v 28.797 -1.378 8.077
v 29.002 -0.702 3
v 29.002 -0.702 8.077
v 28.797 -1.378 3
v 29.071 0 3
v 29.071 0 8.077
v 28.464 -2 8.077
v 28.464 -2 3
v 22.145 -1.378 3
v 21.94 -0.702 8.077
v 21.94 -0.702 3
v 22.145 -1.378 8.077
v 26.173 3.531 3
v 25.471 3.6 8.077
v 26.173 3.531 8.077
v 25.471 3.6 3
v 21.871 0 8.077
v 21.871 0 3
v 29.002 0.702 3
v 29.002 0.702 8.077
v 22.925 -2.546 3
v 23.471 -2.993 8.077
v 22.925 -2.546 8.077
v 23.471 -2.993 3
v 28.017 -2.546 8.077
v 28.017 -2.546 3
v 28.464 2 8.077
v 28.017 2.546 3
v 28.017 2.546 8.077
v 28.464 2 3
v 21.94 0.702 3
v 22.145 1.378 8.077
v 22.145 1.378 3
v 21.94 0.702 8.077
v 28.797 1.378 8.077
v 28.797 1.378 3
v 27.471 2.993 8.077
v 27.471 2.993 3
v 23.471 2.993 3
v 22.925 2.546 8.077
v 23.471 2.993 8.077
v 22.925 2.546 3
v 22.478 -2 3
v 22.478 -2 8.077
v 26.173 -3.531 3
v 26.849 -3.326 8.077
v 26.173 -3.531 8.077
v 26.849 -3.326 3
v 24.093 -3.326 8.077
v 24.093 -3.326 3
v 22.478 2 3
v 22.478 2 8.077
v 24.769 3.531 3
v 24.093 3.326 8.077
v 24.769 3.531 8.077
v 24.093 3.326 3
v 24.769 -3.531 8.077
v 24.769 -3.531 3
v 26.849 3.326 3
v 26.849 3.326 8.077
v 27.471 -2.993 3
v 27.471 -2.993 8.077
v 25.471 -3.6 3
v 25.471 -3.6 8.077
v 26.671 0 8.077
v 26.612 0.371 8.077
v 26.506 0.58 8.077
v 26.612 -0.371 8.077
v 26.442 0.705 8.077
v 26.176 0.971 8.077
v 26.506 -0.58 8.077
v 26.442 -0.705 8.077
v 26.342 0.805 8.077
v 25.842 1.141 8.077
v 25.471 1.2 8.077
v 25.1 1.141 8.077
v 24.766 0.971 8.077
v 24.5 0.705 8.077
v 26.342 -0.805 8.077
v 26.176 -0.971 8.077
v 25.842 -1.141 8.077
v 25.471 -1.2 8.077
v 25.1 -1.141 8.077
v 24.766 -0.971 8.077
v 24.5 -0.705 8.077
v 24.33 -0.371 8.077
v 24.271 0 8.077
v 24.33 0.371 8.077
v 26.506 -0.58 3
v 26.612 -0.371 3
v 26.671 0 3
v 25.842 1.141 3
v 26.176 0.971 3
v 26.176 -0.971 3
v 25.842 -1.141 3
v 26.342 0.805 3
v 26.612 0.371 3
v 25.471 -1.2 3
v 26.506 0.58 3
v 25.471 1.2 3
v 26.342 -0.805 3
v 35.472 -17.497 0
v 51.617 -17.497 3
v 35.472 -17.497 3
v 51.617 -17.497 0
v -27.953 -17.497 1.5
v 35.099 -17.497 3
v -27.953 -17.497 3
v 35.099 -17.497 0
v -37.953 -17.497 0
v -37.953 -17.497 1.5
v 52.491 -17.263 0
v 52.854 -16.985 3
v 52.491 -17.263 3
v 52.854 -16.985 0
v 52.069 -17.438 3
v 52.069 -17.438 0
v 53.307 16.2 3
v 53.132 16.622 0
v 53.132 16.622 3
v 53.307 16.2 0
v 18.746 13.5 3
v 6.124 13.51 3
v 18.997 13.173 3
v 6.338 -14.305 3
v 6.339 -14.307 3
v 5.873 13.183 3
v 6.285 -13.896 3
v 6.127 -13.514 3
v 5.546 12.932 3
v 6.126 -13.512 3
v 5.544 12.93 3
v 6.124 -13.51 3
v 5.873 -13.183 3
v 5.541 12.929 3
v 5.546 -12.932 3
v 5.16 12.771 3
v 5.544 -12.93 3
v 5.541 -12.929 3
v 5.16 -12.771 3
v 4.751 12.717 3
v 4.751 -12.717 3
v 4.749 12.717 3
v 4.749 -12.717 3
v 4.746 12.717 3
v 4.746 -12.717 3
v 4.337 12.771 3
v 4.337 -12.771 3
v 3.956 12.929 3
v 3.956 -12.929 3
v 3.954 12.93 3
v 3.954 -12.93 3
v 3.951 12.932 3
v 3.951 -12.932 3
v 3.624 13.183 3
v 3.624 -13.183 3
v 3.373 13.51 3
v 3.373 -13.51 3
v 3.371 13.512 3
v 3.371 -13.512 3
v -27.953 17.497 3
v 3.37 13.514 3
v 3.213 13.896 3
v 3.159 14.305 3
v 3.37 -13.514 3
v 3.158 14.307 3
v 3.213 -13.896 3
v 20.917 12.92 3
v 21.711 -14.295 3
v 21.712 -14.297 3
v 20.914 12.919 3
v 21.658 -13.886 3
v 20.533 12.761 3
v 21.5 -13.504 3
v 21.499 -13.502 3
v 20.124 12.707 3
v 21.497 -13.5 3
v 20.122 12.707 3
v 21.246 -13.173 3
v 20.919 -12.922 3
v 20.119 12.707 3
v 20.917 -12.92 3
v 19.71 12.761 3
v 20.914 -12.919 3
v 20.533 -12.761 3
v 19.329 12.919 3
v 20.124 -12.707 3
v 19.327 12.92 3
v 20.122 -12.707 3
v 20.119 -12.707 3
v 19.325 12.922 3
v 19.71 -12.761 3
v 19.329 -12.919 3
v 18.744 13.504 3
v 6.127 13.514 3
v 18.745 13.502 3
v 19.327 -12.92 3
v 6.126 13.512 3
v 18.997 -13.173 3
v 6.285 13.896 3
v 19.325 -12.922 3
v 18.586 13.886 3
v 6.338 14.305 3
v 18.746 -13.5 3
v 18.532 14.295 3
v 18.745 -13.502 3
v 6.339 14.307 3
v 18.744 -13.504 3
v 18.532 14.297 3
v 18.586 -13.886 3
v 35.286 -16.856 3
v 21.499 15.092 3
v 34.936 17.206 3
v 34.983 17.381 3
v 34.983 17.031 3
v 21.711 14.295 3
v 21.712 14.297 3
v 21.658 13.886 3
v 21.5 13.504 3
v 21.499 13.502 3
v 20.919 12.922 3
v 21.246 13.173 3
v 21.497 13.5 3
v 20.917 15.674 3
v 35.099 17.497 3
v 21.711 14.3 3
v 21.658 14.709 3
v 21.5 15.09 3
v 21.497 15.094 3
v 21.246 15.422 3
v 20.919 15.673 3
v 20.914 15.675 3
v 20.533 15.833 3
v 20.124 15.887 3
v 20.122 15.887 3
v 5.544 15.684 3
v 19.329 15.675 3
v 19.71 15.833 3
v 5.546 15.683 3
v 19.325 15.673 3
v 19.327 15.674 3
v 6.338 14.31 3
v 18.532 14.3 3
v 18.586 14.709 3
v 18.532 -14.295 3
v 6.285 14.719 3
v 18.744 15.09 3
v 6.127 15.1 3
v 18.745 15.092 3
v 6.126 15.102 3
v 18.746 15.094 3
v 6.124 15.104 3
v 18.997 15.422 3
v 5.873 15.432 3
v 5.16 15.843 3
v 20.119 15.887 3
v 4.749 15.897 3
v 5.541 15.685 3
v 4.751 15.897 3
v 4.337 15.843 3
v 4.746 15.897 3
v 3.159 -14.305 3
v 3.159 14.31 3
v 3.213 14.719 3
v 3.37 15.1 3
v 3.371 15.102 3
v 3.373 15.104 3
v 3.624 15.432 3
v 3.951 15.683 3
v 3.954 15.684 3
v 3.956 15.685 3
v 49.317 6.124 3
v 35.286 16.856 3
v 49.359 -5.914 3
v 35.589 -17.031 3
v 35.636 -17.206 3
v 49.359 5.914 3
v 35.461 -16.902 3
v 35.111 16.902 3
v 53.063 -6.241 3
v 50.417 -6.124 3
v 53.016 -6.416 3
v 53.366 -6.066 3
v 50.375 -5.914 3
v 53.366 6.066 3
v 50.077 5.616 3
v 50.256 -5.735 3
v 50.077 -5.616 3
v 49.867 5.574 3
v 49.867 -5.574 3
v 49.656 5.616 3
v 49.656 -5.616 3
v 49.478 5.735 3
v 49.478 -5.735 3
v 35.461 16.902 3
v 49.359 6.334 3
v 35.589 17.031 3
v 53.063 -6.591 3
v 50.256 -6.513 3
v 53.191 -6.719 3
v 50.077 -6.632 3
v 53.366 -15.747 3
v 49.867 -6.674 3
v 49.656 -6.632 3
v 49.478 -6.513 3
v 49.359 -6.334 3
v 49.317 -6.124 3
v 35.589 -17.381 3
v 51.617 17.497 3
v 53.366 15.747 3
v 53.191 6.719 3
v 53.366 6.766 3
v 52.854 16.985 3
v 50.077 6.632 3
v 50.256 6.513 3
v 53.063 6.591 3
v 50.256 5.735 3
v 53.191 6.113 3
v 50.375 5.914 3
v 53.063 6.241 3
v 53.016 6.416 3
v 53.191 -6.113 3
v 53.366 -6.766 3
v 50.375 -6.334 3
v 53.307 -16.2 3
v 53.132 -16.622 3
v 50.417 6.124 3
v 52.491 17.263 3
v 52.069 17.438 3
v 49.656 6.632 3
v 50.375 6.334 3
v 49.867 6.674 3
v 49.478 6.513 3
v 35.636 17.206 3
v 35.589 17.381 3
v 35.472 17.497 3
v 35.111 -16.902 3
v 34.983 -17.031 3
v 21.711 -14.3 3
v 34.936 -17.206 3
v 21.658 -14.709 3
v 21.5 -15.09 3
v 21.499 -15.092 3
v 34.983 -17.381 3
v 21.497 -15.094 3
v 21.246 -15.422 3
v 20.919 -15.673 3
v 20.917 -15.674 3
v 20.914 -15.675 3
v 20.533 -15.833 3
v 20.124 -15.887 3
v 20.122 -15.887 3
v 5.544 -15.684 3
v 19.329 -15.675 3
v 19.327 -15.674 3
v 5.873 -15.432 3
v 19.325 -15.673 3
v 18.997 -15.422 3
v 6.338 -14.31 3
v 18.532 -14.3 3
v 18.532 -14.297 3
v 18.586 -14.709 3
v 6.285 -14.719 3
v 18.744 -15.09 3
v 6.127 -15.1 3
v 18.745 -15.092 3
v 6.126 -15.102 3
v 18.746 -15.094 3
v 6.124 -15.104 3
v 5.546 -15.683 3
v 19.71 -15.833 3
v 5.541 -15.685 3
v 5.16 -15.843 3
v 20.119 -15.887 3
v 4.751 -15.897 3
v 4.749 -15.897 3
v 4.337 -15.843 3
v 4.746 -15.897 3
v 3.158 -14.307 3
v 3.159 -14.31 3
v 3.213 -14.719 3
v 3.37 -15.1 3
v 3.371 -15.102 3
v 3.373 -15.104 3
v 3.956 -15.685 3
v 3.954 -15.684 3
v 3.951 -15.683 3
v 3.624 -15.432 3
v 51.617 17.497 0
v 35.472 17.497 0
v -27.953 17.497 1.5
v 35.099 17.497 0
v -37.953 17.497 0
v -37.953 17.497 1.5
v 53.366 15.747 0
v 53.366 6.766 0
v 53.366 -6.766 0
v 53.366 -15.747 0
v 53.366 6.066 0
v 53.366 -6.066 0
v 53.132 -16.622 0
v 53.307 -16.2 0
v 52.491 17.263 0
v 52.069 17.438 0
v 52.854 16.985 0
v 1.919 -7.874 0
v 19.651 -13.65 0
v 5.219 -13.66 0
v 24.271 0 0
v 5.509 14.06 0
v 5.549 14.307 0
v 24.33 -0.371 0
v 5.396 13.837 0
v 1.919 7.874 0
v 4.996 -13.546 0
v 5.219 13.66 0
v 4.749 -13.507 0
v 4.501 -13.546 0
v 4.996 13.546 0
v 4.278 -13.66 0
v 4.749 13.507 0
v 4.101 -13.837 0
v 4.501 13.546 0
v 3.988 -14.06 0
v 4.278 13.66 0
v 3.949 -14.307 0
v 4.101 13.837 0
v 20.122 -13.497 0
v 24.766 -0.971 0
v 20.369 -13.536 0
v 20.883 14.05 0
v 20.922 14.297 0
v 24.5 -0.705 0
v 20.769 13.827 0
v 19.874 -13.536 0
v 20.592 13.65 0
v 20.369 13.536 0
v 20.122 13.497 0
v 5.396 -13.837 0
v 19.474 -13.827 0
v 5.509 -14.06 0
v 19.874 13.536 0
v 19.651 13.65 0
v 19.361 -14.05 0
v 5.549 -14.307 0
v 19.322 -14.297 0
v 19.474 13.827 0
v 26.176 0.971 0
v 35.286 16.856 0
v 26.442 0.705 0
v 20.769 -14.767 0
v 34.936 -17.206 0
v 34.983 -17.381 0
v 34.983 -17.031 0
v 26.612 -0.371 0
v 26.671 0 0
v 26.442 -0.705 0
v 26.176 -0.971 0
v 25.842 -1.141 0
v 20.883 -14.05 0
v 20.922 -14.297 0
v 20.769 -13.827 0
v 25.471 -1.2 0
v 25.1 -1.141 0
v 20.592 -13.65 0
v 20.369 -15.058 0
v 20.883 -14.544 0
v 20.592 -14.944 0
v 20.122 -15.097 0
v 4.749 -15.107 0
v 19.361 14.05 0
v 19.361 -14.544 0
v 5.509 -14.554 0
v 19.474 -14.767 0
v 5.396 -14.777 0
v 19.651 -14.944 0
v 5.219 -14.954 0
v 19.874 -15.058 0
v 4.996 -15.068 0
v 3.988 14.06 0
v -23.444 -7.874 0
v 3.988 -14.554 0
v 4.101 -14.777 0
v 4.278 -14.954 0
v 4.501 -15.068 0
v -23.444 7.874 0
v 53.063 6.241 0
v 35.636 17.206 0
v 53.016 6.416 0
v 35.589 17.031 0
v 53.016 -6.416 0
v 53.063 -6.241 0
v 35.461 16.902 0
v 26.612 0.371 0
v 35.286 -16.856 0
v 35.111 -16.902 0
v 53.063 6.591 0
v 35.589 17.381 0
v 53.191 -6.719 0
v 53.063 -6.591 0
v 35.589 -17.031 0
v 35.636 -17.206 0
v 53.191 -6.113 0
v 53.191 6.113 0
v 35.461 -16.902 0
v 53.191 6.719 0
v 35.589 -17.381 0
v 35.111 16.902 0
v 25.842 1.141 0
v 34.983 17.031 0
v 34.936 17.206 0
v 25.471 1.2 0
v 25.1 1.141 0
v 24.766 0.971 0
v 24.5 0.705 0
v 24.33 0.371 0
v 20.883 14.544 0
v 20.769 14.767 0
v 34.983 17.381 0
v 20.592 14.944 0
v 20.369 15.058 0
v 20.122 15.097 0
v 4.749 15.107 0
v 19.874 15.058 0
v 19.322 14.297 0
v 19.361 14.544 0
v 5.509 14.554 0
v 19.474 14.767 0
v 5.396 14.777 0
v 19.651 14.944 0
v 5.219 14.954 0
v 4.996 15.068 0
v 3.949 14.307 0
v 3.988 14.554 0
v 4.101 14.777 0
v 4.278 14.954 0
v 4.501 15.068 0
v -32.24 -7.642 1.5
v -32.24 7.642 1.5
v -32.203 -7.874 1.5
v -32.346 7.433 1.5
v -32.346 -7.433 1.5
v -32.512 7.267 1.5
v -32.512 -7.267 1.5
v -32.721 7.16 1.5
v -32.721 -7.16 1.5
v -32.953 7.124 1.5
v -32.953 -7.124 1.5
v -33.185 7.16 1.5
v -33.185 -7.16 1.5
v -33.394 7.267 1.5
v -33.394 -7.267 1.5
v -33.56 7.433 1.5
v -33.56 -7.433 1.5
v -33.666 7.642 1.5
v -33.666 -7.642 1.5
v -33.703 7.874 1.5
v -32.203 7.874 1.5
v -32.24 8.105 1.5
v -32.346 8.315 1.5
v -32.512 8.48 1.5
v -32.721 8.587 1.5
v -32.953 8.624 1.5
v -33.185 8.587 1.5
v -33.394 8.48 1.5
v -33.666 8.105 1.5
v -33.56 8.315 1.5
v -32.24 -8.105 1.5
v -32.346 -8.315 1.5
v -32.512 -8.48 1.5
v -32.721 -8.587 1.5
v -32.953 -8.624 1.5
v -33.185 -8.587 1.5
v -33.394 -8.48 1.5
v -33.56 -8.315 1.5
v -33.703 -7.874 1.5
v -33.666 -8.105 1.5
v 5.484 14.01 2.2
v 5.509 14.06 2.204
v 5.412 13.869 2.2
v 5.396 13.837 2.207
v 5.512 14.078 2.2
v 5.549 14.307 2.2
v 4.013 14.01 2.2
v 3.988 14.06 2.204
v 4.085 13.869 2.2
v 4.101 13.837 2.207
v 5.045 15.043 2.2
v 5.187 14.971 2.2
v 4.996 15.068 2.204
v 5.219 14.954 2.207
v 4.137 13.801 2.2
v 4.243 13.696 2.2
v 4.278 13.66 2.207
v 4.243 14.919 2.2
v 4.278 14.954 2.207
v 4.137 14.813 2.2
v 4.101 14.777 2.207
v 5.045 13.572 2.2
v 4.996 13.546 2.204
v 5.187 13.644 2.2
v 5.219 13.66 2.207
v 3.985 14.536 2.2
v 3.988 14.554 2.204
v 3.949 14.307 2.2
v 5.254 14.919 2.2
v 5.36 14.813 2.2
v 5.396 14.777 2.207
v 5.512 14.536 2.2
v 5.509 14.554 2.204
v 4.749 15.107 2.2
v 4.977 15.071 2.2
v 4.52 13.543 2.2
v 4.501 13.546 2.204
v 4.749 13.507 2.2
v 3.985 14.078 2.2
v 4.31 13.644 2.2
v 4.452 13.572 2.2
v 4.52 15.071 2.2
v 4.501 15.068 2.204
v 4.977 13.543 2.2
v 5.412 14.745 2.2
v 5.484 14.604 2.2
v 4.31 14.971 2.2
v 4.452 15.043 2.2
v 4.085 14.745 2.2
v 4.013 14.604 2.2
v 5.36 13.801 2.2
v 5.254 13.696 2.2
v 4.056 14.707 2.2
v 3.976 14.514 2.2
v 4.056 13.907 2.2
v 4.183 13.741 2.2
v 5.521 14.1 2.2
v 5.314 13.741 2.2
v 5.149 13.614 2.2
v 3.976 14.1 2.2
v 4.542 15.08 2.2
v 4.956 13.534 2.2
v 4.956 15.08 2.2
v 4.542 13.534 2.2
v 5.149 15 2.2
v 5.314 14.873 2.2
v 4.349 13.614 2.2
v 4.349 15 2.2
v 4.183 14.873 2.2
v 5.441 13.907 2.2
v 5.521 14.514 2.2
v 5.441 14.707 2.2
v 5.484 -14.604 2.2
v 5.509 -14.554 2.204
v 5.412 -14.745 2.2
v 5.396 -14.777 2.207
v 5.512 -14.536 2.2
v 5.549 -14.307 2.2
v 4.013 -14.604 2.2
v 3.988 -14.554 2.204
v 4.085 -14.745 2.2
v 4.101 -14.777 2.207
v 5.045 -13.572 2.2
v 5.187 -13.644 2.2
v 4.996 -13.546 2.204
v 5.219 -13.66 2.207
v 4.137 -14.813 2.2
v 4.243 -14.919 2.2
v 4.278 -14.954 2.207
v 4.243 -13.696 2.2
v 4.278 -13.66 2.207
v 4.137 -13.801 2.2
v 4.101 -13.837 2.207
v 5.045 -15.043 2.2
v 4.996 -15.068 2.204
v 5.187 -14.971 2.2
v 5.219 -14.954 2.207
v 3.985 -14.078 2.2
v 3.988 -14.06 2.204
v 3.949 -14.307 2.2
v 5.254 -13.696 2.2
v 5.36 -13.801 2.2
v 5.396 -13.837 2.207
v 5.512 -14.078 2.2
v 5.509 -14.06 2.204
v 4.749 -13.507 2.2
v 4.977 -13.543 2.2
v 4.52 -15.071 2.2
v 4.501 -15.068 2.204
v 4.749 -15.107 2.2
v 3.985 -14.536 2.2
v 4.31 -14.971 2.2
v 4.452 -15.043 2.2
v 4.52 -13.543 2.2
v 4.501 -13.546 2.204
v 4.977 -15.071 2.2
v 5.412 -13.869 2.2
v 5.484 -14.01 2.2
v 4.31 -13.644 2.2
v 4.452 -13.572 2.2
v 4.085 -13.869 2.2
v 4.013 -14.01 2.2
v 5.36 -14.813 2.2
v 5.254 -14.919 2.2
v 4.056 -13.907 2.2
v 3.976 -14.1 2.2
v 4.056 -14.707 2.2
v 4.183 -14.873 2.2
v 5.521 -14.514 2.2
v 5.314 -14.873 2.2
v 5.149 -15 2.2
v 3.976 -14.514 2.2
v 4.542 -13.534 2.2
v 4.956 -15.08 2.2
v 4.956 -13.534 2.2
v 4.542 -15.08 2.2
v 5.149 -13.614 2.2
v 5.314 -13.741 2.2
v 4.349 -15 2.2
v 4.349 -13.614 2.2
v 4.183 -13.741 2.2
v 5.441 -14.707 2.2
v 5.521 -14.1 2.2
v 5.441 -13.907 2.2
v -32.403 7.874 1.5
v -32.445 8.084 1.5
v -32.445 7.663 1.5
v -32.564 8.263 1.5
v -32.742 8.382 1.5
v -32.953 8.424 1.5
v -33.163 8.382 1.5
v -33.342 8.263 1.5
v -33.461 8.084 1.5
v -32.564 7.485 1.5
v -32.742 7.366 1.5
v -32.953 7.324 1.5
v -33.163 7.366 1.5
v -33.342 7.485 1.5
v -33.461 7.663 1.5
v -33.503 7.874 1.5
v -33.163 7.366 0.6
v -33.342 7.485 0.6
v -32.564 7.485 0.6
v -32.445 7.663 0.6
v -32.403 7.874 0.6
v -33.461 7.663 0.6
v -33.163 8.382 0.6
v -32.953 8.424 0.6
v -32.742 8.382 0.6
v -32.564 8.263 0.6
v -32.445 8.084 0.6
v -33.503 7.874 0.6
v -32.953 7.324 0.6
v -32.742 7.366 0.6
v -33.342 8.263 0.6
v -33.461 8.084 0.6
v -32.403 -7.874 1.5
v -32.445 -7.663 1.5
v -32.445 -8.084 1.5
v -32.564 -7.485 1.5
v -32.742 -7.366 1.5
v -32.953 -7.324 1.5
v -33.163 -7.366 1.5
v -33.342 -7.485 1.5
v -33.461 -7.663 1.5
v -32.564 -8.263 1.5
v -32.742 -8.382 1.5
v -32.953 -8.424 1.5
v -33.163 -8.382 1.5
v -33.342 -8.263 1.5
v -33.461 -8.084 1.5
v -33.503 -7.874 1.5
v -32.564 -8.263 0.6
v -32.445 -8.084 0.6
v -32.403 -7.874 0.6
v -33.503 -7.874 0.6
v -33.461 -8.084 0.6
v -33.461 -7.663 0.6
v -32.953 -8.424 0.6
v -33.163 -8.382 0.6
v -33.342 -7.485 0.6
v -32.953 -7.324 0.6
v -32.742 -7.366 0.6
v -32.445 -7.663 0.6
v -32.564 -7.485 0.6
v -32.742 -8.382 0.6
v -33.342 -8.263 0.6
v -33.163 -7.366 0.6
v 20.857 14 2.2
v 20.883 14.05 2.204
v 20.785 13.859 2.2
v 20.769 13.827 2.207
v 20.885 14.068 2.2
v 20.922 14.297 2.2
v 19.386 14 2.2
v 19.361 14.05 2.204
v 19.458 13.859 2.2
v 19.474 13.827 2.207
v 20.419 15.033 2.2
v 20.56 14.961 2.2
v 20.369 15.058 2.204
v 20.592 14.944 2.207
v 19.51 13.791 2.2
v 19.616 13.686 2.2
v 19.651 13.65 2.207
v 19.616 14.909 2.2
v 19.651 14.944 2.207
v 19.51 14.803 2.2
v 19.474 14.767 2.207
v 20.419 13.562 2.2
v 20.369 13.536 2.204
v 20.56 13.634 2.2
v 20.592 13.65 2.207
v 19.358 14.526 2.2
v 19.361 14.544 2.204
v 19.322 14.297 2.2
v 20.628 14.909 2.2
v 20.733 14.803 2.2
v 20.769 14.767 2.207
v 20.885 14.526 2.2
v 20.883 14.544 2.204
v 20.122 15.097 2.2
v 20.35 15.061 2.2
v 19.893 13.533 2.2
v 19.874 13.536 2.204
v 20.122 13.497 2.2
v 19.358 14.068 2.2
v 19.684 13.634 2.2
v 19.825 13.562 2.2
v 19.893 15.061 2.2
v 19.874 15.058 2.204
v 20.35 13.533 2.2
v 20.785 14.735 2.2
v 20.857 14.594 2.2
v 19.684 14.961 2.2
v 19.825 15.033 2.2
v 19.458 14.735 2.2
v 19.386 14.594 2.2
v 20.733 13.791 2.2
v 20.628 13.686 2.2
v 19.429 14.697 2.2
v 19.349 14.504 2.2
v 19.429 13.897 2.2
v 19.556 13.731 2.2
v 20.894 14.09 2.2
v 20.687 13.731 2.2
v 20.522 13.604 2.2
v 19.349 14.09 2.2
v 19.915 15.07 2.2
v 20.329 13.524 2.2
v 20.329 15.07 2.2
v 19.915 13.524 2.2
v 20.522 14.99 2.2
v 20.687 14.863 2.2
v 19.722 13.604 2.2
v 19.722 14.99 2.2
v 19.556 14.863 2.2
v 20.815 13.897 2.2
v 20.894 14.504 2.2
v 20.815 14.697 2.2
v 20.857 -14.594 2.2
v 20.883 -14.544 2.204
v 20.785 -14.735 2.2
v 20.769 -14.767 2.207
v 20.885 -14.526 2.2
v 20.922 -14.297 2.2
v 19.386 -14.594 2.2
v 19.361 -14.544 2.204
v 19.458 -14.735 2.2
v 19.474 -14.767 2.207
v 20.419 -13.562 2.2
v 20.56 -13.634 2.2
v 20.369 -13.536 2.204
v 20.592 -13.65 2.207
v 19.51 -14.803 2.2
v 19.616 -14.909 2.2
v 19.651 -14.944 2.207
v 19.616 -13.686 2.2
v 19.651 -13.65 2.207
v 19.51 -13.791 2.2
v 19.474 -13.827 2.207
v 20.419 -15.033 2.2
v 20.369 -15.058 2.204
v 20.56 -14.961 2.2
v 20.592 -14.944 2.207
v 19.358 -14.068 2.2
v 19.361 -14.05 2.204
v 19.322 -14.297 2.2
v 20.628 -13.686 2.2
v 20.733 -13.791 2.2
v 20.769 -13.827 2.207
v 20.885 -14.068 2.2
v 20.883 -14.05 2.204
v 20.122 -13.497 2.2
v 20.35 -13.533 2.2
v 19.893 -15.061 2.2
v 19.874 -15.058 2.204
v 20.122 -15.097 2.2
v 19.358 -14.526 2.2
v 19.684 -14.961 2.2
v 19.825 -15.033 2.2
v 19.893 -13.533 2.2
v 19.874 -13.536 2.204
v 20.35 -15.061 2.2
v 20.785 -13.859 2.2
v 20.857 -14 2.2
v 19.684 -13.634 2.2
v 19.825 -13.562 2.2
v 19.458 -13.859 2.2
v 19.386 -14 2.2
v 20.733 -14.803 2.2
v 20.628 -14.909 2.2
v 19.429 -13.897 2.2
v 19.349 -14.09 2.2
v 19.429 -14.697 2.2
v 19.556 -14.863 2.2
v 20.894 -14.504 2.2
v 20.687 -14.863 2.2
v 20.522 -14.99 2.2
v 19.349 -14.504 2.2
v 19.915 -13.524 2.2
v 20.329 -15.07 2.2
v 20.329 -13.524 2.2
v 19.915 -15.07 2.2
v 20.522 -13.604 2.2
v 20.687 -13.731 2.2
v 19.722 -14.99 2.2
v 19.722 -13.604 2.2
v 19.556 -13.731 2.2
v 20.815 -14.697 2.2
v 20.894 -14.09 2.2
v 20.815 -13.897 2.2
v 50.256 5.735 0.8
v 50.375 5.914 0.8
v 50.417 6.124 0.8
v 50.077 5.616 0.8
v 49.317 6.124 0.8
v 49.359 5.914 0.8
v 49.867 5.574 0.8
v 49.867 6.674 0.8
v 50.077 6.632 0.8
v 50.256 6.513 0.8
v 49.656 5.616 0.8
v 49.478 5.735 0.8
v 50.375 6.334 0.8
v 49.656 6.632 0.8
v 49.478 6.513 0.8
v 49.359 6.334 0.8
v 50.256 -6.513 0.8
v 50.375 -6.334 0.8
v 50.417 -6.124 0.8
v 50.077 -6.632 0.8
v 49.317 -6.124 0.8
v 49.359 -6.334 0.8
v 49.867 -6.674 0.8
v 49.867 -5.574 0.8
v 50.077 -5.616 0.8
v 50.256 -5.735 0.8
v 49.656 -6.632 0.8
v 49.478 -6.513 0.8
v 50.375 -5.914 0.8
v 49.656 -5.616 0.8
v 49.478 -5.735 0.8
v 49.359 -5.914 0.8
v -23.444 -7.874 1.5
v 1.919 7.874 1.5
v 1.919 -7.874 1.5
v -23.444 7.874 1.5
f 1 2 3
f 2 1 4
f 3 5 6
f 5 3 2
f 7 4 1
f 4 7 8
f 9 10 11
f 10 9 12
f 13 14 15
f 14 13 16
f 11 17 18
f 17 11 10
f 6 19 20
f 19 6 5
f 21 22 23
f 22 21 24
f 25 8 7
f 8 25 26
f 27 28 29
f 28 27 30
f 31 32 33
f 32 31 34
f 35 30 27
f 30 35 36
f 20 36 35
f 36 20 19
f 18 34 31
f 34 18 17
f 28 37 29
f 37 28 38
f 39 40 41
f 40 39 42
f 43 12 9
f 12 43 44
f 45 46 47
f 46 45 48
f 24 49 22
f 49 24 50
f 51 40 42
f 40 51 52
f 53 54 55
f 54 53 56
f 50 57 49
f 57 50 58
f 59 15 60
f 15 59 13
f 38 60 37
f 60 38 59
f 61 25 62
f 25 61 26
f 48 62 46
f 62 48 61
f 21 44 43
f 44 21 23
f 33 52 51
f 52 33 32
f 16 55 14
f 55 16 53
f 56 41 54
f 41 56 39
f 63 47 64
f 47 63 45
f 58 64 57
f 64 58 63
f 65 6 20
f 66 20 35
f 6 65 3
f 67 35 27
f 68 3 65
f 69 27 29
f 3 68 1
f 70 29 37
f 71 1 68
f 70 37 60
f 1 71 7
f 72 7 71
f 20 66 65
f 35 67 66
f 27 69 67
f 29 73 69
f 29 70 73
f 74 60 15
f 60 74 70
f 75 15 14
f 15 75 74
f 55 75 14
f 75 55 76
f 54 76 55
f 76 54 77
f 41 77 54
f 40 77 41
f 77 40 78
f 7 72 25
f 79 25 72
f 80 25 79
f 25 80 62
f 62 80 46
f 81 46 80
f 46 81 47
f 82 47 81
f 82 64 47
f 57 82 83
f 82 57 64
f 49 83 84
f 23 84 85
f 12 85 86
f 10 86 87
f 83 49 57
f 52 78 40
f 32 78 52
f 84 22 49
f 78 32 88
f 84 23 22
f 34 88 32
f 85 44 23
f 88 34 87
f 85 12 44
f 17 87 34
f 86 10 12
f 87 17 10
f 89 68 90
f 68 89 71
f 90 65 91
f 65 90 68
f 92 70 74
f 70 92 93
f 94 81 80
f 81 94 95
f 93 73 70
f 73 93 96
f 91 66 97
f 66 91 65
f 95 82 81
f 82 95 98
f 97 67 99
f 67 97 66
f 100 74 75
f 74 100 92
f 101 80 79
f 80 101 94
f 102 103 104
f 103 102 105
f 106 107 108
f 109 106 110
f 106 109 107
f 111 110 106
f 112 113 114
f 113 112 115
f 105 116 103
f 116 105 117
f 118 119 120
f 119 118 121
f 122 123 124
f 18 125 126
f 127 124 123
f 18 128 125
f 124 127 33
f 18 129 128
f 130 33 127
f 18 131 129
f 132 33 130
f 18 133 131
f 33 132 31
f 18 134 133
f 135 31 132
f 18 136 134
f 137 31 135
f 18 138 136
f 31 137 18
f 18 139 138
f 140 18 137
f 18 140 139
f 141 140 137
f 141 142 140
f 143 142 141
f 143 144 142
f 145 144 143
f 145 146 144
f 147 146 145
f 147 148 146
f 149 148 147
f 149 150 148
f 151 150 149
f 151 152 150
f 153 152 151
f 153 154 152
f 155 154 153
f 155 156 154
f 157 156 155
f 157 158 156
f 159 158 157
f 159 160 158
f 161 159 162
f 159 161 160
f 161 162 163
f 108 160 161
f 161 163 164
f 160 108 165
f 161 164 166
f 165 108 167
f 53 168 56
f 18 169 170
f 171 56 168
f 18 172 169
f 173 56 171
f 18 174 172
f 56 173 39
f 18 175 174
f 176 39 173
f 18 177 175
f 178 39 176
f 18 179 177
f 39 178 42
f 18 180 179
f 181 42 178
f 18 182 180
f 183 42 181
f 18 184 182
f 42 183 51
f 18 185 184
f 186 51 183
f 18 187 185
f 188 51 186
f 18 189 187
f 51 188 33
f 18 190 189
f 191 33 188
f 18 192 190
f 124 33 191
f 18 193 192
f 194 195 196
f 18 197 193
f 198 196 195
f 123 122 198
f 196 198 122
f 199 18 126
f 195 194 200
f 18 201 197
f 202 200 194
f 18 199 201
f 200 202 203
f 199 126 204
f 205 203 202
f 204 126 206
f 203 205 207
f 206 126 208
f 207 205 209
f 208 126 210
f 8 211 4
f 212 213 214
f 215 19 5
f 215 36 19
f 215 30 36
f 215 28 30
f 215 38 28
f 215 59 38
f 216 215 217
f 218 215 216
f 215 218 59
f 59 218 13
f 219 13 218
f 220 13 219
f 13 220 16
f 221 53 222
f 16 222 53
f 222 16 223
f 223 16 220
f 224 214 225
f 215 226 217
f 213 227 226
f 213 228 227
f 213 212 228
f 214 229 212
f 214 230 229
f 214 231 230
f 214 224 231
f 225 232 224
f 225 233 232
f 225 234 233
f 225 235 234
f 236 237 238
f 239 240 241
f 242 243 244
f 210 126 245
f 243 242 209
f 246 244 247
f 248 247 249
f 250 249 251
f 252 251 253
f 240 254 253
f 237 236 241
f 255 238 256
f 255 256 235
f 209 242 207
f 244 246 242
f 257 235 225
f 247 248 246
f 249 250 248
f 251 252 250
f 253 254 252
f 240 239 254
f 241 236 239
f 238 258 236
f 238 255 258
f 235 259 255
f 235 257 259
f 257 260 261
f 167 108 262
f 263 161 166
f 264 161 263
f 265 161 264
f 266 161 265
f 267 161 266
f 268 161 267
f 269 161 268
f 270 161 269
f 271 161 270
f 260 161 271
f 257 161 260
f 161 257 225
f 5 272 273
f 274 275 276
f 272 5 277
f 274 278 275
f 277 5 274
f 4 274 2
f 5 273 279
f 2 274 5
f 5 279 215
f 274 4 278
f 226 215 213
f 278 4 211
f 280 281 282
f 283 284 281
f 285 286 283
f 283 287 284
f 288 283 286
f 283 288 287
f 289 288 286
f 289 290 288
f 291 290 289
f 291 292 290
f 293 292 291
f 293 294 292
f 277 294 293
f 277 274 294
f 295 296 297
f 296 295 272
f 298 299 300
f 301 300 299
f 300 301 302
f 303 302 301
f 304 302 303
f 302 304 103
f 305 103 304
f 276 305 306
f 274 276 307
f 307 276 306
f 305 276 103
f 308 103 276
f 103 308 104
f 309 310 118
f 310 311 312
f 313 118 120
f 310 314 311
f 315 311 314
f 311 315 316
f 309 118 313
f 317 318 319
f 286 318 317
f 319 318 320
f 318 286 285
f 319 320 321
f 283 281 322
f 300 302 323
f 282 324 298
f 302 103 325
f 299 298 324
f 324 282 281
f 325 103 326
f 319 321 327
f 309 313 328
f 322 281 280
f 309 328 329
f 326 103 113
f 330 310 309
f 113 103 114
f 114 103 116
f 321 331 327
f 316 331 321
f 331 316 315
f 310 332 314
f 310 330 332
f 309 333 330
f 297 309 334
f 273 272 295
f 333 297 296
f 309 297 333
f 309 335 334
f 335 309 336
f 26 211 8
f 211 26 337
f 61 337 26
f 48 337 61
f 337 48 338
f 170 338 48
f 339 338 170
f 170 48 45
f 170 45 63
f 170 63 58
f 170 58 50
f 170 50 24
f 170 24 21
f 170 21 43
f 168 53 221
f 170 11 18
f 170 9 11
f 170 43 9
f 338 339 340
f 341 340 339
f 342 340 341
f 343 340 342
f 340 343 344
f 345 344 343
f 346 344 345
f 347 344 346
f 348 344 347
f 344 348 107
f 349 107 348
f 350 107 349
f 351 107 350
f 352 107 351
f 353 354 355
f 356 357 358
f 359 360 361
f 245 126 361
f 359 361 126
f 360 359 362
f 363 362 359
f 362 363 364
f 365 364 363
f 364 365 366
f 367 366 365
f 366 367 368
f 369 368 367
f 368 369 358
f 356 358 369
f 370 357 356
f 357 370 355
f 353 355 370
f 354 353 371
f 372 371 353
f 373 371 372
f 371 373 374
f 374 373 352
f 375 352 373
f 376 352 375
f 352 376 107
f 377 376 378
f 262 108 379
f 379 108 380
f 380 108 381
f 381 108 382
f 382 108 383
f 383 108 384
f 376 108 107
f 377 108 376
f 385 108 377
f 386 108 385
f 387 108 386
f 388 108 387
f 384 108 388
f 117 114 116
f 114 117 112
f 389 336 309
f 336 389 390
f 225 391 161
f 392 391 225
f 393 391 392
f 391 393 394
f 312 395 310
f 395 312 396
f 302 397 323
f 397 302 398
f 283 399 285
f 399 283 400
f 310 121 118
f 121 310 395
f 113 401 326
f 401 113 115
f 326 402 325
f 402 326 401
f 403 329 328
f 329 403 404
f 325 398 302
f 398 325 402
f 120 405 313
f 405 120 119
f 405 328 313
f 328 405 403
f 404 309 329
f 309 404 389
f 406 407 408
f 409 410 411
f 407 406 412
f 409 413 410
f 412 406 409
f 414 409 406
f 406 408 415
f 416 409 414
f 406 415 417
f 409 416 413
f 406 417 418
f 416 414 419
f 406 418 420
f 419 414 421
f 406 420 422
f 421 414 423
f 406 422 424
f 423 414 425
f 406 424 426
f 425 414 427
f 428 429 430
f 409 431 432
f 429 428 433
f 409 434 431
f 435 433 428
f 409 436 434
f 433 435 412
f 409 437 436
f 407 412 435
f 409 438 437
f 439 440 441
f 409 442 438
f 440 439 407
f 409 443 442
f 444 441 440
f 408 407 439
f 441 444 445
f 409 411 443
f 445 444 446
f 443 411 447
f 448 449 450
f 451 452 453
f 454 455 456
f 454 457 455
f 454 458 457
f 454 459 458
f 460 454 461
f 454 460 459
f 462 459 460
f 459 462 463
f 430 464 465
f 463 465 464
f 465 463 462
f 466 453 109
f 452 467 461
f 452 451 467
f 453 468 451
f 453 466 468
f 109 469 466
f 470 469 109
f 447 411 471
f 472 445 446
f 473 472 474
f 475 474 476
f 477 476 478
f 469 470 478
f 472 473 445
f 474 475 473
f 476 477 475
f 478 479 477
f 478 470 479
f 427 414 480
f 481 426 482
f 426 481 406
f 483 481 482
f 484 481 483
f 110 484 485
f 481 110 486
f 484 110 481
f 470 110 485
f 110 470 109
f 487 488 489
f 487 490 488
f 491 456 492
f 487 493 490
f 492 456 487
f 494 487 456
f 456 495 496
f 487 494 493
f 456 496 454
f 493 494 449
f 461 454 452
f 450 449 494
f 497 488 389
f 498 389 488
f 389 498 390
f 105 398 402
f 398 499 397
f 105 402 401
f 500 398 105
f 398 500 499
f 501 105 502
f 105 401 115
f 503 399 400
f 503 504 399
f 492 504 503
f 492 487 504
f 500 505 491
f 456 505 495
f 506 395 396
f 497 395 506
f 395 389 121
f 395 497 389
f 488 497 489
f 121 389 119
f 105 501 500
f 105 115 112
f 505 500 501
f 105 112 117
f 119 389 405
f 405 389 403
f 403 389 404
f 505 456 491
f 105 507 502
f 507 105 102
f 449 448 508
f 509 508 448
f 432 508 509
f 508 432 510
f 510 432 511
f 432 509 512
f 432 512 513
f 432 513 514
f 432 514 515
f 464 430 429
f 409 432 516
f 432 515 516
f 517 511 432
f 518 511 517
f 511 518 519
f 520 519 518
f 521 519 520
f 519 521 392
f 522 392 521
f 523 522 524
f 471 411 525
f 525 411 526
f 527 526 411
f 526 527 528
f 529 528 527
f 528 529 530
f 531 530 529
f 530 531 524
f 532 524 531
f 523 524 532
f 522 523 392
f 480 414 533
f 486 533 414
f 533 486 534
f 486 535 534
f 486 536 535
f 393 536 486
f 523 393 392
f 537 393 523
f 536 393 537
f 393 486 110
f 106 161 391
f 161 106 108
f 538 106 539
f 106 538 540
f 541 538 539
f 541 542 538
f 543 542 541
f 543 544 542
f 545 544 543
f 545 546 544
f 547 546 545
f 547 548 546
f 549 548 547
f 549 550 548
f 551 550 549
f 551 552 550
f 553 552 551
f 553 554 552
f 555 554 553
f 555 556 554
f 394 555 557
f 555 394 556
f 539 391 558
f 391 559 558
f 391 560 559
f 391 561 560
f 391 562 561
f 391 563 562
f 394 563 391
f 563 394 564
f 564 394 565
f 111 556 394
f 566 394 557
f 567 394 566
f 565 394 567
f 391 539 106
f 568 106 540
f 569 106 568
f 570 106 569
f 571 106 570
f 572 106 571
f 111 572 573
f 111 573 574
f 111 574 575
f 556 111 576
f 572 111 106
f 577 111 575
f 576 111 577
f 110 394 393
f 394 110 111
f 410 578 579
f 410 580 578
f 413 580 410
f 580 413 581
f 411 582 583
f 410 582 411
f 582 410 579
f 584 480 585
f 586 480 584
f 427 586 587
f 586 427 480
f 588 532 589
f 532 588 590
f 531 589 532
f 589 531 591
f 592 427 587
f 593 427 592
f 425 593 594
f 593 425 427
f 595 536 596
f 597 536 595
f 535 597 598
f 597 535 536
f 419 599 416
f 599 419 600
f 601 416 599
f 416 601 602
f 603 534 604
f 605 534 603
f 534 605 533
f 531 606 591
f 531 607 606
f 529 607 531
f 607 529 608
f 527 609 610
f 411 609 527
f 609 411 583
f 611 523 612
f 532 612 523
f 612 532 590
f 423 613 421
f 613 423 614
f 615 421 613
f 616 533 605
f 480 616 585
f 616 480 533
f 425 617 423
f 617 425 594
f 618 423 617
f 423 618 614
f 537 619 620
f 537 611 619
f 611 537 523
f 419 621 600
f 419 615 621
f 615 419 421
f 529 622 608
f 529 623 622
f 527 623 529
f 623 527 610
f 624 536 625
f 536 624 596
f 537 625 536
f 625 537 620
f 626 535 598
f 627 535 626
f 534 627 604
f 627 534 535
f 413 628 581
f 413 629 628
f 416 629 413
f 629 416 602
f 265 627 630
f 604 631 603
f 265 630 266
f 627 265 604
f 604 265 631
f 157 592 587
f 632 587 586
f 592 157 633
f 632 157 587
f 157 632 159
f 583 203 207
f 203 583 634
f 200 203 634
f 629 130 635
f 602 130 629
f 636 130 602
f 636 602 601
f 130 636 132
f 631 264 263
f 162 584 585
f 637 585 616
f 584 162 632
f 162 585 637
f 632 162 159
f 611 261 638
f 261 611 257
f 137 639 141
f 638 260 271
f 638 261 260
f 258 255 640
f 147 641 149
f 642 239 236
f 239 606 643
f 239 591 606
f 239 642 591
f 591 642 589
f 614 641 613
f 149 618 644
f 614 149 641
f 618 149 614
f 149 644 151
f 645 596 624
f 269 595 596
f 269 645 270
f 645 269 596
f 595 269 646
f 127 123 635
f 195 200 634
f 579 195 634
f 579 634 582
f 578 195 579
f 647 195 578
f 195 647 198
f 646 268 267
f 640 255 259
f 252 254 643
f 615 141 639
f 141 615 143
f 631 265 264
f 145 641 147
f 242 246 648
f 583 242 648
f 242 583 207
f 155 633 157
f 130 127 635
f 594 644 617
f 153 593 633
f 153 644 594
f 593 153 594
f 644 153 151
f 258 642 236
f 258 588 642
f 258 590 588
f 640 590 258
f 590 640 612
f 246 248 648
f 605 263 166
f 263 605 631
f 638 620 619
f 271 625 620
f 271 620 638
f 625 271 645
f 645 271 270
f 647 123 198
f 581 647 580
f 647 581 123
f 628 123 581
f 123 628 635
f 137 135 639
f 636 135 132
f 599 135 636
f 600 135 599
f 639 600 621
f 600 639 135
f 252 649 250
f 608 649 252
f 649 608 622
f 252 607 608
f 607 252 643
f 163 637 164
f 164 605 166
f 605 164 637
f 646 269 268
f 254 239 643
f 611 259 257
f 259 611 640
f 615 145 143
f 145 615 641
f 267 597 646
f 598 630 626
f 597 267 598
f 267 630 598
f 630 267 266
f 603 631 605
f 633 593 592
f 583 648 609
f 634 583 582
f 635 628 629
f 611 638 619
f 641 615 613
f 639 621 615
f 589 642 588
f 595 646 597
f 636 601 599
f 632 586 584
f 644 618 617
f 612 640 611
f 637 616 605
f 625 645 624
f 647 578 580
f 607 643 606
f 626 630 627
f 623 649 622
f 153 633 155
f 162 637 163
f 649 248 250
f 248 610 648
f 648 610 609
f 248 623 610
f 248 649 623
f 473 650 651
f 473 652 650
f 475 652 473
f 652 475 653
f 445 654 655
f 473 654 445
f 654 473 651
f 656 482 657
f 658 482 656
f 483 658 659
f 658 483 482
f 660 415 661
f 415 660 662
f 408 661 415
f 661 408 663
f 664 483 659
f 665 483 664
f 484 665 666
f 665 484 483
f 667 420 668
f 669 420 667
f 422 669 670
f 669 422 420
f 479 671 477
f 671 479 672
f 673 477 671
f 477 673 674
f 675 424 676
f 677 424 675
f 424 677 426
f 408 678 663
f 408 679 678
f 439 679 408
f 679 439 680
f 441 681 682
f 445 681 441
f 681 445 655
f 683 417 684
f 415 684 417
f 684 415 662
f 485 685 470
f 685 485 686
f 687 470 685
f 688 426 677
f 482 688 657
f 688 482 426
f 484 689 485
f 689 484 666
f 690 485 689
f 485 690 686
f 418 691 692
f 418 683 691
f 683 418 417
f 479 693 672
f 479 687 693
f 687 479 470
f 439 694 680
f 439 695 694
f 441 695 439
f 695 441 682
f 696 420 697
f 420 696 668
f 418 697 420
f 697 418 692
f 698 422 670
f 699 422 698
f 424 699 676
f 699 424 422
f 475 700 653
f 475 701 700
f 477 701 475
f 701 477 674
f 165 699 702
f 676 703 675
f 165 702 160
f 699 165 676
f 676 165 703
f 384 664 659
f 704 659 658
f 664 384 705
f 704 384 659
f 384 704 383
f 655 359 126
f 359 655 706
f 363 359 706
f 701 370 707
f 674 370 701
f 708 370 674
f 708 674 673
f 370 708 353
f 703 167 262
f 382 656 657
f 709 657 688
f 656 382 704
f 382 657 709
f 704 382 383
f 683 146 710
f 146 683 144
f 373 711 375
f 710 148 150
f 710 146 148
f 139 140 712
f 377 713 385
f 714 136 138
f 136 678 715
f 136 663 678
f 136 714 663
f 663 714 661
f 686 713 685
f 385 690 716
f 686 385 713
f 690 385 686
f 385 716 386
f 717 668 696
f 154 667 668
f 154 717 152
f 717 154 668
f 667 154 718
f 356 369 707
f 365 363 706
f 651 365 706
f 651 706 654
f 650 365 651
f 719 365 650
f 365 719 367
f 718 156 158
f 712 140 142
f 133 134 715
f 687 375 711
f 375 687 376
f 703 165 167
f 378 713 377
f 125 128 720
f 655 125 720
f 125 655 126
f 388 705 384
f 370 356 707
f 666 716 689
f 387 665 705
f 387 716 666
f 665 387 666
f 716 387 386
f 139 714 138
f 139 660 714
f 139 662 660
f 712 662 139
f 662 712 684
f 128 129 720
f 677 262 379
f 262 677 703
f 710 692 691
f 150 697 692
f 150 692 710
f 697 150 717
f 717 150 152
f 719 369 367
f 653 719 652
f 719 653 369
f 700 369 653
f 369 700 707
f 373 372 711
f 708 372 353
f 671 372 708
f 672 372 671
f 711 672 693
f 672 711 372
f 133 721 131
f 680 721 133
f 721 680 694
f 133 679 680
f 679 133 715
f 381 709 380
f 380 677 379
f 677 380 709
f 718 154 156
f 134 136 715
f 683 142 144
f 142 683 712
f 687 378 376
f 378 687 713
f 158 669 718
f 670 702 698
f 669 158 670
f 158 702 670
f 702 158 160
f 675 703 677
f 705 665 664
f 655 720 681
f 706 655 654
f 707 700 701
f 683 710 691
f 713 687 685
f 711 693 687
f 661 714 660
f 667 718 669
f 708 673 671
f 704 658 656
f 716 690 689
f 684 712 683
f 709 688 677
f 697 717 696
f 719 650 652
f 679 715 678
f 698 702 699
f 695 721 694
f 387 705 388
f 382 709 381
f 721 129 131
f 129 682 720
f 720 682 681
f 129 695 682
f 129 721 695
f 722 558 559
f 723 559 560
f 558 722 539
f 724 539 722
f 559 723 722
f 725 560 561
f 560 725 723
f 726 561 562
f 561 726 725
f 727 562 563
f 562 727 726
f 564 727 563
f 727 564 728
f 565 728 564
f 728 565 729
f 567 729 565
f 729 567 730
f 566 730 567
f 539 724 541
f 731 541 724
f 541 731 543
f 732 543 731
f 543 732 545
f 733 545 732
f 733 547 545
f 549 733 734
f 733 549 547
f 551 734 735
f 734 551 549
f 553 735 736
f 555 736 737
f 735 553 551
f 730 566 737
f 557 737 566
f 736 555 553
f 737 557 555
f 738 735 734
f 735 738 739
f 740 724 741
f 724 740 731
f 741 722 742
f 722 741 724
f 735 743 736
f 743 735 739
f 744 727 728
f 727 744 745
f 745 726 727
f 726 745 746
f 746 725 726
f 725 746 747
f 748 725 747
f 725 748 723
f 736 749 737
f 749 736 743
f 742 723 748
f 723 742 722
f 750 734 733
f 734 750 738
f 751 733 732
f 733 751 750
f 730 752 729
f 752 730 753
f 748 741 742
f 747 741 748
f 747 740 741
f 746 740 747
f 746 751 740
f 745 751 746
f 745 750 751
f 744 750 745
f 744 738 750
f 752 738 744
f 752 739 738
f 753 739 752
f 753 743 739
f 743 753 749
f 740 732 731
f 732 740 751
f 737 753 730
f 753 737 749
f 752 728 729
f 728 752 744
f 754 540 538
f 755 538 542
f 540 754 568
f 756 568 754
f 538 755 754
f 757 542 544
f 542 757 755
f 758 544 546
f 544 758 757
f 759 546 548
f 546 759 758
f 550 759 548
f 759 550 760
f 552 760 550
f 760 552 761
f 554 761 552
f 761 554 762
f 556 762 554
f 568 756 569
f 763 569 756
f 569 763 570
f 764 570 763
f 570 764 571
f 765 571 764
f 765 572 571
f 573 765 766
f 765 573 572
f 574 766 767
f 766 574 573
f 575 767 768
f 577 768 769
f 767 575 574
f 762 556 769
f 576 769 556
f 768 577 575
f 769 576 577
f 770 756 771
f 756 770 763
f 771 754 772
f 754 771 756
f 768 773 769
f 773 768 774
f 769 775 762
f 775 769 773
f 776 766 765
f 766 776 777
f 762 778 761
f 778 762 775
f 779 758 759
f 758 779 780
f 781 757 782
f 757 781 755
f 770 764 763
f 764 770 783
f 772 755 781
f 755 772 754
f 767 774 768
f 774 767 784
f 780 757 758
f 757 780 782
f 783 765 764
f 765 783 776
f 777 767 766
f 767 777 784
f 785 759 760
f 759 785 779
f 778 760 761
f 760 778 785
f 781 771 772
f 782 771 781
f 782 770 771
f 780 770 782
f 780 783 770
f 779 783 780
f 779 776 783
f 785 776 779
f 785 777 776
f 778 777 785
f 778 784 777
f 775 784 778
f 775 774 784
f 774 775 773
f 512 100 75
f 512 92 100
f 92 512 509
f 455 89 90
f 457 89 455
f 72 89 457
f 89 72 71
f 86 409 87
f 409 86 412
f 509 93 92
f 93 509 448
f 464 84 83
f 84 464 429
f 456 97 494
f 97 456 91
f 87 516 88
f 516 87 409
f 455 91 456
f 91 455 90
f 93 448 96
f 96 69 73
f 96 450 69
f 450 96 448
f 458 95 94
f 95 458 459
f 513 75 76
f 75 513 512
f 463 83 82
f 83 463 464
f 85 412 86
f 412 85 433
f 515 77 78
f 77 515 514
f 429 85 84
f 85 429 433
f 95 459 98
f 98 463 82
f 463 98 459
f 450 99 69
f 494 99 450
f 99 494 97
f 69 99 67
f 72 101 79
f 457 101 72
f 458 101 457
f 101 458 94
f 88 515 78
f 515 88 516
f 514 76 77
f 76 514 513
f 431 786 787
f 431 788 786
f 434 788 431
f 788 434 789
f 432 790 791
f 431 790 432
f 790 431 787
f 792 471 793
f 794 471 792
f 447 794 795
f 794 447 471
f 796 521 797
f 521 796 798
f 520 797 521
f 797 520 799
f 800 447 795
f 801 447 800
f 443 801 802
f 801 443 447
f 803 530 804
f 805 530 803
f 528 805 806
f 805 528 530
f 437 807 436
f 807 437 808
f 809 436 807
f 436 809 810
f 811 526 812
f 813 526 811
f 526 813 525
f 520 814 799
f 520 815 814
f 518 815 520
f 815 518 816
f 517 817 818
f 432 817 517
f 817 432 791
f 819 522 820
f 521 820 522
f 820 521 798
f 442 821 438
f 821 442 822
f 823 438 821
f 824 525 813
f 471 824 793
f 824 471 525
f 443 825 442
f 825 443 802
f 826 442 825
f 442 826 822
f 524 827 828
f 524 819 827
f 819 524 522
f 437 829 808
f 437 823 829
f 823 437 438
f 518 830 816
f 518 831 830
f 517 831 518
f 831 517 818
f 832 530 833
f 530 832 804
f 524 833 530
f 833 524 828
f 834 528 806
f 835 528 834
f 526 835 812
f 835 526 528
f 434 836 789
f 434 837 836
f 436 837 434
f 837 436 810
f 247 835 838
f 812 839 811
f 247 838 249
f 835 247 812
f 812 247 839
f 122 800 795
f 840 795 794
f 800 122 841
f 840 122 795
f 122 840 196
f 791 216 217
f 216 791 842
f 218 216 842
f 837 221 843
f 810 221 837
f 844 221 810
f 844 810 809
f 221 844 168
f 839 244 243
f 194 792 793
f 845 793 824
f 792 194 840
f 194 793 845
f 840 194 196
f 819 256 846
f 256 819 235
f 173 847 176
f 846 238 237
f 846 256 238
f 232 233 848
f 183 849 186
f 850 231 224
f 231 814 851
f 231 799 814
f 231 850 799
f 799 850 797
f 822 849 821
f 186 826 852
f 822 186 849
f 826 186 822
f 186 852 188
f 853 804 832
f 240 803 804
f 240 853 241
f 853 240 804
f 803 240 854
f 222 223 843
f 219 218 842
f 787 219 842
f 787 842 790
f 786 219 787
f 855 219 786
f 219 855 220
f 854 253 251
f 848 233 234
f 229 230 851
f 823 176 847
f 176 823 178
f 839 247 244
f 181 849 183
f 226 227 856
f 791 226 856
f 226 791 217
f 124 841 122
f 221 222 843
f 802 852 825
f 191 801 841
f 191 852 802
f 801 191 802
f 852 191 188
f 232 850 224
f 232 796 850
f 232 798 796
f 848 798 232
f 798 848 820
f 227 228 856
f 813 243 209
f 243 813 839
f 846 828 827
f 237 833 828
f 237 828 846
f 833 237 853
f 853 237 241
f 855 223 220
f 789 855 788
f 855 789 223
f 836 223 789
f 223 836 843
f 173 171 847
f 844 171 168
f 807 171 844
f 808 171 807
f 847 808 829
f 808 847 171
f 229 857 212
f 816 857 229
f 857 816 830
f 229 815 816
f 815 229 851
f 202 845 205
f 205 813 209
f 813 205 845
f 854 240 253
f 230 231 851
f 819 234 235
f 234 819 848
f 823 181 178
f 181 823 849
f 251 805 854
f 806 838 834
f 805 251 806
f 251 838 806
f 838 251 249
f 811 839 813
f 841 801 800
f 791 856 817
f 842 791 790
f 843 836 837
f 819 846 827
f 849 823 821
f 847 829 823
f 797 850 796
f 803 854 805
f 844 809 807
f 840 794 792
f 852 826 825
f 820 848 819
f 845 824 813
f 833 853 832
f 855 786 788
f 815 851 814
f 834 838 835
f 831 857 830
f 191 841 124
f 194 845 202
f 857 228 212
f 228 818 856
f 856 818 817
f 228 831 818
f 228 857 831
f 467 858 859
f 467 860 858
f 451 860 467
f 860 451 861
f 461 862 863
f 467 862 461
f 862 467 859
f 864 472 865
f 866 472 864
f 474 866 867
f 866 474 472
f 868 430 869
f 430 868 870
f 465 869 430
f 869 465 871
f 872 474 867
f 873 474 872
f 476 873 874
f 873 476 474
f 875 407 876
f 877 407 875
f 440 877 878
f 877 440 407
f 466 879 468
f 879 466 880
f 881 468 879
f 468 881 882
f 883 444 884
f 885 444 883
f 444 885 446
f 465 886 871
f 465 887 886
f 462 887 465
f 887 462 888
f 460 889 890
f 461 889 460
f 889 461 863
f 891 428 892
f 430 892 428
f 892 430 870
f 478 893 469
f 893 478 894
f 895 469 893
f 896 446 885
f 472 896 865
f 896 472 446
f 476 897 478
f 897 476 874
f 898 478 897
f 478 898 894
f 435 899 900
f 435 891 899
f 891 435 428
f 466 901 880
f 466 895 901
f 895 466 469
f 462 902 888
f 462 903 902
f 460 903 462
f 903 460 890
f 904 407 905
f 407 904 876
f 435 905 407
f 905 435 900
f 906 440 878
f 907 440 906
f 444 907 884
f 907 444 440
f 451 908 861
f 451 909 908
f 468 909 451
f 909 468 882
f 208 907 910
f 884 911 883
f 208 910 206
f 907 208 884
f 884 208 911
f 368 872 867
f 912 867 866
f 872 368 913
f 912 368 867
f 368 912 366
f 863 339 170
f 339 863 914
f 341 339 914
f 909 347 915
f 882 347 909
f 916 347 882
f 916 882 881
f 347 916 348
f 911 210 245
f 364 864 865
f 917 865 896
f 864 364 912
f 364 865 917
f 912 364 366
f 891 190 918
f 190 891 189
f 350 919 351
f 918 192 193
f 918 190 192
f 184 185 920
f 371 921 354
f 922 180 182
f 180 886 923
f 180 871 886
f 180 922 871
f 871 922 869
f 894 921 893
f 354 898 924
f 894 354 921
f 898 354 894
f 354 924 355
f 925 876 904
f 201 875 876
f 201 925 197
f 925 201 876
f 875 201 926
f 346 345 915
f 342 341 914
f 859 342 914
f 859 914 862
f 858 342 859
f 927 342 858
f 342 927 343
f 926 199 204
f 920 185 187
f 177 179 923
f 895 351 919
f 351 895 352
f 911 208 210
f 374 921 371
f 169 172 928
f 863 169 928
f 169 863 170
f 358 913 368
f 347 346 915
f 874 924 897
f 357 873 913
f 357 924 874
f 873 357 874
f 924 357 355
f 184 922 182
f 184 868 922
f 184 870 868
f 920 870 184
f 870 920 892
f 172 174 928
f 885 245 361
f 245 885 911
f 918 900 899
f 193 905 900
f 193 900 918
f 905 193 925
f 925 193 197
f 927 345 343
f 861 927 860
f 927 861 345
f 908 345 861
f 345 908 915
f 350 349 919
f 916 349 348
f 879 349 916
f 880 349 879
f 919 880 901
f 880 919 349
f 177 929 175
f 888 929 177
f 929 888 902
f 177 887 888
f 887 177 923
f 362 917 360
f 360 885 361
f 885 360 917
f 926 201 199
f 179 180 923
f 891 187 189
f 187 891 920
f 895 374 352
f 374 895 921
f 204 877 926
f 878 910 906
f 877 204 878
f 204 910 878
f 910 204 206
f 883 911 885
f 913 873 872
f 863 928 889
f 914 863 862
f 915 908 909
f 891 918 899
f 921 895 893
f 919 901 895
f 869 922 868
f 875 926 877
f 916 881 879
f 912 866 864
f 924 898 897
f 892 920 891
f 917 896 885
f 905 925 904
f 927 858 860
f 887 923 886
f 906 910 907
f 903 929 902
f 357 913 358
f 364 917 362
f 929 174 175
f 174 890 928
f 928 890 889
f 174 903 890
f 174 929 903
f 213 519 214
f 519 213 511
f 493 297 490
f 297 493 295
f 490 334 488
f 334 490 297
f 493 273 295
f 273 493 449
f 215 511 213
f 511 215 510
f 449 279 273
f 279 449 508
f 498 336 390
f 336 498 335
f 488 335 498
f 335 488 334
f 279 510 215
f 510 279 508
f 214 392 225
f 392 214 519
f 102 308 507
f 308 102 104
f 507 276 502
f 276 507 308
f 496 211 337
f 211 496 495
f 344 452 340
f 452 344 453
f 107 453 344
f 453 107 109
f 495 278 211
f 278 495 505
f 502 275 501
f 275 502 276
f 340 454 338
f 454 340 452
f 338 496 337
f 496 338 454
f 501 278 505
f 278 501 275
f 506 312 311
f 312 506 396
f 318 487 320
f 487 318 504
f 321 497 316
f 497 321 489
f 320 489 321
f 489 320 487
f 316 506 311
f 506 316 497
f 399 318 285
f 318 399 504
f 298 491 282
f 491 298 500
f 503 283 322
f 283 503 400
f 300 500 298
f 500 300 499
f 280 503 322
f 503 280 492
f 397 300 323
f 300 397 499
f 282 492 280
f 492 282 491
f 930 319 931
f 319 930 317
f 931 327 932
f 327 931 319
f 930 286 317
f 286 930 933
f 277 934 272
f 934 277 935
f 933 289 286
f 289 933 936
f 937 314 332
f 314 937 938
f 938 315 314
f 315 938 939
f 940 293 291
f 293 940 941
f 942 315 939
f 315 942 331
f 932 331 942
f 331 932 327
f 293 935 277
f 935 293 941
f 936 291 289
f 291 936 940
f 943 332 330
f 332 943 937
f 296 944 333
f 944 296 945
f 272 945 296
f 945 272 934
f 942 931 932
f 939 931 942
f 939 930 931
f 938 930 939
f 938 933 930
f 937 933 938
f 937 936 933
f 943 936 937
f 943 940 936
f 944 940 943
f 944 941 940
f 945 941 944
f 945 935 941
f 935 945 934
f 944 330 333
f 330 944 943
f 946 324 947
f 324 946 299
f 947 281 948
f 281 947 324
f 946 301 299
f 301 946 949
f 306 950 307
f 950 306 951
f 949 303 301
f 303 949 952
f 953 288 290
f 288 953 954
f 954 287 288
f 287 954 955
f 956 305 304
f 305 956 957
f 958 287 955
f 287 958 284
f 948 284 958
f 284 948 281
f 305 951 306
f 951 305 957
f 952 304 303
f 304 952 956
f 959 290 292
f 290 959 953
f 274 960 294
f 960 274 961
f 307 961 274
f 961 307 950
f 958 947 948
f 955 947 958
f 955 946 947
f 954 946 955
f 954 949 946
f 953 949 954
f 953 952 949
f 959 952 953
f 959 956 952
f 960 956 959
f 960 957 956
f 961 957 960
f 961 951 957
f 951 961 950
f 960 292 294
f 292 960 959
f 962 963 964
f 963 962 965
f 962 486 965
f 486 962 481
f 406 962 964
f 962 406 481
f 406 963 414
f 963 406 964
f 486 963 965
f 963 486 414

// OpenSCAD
// Milwaukee Road Little Joe, HO scale 1-87 - print 7 of 11: frame_3 - frame / deck piece 3 (print upside down)
// Render (F6), export STL, print. Settings: ../../library/lj_params.scad
// Whole loco preview and notes: ../../MILW_LittleJoe_Main.scad
SCALE_SEL = "HO";
LOCO_SEL = "E70";   // [E20, E21, E70, E71, E72, E73, E74, E75, E76, E77, E78, E79] the body and roof change for E20 / E21
include <../../library/lj_all.scad>
lj_plate("frame_3");
